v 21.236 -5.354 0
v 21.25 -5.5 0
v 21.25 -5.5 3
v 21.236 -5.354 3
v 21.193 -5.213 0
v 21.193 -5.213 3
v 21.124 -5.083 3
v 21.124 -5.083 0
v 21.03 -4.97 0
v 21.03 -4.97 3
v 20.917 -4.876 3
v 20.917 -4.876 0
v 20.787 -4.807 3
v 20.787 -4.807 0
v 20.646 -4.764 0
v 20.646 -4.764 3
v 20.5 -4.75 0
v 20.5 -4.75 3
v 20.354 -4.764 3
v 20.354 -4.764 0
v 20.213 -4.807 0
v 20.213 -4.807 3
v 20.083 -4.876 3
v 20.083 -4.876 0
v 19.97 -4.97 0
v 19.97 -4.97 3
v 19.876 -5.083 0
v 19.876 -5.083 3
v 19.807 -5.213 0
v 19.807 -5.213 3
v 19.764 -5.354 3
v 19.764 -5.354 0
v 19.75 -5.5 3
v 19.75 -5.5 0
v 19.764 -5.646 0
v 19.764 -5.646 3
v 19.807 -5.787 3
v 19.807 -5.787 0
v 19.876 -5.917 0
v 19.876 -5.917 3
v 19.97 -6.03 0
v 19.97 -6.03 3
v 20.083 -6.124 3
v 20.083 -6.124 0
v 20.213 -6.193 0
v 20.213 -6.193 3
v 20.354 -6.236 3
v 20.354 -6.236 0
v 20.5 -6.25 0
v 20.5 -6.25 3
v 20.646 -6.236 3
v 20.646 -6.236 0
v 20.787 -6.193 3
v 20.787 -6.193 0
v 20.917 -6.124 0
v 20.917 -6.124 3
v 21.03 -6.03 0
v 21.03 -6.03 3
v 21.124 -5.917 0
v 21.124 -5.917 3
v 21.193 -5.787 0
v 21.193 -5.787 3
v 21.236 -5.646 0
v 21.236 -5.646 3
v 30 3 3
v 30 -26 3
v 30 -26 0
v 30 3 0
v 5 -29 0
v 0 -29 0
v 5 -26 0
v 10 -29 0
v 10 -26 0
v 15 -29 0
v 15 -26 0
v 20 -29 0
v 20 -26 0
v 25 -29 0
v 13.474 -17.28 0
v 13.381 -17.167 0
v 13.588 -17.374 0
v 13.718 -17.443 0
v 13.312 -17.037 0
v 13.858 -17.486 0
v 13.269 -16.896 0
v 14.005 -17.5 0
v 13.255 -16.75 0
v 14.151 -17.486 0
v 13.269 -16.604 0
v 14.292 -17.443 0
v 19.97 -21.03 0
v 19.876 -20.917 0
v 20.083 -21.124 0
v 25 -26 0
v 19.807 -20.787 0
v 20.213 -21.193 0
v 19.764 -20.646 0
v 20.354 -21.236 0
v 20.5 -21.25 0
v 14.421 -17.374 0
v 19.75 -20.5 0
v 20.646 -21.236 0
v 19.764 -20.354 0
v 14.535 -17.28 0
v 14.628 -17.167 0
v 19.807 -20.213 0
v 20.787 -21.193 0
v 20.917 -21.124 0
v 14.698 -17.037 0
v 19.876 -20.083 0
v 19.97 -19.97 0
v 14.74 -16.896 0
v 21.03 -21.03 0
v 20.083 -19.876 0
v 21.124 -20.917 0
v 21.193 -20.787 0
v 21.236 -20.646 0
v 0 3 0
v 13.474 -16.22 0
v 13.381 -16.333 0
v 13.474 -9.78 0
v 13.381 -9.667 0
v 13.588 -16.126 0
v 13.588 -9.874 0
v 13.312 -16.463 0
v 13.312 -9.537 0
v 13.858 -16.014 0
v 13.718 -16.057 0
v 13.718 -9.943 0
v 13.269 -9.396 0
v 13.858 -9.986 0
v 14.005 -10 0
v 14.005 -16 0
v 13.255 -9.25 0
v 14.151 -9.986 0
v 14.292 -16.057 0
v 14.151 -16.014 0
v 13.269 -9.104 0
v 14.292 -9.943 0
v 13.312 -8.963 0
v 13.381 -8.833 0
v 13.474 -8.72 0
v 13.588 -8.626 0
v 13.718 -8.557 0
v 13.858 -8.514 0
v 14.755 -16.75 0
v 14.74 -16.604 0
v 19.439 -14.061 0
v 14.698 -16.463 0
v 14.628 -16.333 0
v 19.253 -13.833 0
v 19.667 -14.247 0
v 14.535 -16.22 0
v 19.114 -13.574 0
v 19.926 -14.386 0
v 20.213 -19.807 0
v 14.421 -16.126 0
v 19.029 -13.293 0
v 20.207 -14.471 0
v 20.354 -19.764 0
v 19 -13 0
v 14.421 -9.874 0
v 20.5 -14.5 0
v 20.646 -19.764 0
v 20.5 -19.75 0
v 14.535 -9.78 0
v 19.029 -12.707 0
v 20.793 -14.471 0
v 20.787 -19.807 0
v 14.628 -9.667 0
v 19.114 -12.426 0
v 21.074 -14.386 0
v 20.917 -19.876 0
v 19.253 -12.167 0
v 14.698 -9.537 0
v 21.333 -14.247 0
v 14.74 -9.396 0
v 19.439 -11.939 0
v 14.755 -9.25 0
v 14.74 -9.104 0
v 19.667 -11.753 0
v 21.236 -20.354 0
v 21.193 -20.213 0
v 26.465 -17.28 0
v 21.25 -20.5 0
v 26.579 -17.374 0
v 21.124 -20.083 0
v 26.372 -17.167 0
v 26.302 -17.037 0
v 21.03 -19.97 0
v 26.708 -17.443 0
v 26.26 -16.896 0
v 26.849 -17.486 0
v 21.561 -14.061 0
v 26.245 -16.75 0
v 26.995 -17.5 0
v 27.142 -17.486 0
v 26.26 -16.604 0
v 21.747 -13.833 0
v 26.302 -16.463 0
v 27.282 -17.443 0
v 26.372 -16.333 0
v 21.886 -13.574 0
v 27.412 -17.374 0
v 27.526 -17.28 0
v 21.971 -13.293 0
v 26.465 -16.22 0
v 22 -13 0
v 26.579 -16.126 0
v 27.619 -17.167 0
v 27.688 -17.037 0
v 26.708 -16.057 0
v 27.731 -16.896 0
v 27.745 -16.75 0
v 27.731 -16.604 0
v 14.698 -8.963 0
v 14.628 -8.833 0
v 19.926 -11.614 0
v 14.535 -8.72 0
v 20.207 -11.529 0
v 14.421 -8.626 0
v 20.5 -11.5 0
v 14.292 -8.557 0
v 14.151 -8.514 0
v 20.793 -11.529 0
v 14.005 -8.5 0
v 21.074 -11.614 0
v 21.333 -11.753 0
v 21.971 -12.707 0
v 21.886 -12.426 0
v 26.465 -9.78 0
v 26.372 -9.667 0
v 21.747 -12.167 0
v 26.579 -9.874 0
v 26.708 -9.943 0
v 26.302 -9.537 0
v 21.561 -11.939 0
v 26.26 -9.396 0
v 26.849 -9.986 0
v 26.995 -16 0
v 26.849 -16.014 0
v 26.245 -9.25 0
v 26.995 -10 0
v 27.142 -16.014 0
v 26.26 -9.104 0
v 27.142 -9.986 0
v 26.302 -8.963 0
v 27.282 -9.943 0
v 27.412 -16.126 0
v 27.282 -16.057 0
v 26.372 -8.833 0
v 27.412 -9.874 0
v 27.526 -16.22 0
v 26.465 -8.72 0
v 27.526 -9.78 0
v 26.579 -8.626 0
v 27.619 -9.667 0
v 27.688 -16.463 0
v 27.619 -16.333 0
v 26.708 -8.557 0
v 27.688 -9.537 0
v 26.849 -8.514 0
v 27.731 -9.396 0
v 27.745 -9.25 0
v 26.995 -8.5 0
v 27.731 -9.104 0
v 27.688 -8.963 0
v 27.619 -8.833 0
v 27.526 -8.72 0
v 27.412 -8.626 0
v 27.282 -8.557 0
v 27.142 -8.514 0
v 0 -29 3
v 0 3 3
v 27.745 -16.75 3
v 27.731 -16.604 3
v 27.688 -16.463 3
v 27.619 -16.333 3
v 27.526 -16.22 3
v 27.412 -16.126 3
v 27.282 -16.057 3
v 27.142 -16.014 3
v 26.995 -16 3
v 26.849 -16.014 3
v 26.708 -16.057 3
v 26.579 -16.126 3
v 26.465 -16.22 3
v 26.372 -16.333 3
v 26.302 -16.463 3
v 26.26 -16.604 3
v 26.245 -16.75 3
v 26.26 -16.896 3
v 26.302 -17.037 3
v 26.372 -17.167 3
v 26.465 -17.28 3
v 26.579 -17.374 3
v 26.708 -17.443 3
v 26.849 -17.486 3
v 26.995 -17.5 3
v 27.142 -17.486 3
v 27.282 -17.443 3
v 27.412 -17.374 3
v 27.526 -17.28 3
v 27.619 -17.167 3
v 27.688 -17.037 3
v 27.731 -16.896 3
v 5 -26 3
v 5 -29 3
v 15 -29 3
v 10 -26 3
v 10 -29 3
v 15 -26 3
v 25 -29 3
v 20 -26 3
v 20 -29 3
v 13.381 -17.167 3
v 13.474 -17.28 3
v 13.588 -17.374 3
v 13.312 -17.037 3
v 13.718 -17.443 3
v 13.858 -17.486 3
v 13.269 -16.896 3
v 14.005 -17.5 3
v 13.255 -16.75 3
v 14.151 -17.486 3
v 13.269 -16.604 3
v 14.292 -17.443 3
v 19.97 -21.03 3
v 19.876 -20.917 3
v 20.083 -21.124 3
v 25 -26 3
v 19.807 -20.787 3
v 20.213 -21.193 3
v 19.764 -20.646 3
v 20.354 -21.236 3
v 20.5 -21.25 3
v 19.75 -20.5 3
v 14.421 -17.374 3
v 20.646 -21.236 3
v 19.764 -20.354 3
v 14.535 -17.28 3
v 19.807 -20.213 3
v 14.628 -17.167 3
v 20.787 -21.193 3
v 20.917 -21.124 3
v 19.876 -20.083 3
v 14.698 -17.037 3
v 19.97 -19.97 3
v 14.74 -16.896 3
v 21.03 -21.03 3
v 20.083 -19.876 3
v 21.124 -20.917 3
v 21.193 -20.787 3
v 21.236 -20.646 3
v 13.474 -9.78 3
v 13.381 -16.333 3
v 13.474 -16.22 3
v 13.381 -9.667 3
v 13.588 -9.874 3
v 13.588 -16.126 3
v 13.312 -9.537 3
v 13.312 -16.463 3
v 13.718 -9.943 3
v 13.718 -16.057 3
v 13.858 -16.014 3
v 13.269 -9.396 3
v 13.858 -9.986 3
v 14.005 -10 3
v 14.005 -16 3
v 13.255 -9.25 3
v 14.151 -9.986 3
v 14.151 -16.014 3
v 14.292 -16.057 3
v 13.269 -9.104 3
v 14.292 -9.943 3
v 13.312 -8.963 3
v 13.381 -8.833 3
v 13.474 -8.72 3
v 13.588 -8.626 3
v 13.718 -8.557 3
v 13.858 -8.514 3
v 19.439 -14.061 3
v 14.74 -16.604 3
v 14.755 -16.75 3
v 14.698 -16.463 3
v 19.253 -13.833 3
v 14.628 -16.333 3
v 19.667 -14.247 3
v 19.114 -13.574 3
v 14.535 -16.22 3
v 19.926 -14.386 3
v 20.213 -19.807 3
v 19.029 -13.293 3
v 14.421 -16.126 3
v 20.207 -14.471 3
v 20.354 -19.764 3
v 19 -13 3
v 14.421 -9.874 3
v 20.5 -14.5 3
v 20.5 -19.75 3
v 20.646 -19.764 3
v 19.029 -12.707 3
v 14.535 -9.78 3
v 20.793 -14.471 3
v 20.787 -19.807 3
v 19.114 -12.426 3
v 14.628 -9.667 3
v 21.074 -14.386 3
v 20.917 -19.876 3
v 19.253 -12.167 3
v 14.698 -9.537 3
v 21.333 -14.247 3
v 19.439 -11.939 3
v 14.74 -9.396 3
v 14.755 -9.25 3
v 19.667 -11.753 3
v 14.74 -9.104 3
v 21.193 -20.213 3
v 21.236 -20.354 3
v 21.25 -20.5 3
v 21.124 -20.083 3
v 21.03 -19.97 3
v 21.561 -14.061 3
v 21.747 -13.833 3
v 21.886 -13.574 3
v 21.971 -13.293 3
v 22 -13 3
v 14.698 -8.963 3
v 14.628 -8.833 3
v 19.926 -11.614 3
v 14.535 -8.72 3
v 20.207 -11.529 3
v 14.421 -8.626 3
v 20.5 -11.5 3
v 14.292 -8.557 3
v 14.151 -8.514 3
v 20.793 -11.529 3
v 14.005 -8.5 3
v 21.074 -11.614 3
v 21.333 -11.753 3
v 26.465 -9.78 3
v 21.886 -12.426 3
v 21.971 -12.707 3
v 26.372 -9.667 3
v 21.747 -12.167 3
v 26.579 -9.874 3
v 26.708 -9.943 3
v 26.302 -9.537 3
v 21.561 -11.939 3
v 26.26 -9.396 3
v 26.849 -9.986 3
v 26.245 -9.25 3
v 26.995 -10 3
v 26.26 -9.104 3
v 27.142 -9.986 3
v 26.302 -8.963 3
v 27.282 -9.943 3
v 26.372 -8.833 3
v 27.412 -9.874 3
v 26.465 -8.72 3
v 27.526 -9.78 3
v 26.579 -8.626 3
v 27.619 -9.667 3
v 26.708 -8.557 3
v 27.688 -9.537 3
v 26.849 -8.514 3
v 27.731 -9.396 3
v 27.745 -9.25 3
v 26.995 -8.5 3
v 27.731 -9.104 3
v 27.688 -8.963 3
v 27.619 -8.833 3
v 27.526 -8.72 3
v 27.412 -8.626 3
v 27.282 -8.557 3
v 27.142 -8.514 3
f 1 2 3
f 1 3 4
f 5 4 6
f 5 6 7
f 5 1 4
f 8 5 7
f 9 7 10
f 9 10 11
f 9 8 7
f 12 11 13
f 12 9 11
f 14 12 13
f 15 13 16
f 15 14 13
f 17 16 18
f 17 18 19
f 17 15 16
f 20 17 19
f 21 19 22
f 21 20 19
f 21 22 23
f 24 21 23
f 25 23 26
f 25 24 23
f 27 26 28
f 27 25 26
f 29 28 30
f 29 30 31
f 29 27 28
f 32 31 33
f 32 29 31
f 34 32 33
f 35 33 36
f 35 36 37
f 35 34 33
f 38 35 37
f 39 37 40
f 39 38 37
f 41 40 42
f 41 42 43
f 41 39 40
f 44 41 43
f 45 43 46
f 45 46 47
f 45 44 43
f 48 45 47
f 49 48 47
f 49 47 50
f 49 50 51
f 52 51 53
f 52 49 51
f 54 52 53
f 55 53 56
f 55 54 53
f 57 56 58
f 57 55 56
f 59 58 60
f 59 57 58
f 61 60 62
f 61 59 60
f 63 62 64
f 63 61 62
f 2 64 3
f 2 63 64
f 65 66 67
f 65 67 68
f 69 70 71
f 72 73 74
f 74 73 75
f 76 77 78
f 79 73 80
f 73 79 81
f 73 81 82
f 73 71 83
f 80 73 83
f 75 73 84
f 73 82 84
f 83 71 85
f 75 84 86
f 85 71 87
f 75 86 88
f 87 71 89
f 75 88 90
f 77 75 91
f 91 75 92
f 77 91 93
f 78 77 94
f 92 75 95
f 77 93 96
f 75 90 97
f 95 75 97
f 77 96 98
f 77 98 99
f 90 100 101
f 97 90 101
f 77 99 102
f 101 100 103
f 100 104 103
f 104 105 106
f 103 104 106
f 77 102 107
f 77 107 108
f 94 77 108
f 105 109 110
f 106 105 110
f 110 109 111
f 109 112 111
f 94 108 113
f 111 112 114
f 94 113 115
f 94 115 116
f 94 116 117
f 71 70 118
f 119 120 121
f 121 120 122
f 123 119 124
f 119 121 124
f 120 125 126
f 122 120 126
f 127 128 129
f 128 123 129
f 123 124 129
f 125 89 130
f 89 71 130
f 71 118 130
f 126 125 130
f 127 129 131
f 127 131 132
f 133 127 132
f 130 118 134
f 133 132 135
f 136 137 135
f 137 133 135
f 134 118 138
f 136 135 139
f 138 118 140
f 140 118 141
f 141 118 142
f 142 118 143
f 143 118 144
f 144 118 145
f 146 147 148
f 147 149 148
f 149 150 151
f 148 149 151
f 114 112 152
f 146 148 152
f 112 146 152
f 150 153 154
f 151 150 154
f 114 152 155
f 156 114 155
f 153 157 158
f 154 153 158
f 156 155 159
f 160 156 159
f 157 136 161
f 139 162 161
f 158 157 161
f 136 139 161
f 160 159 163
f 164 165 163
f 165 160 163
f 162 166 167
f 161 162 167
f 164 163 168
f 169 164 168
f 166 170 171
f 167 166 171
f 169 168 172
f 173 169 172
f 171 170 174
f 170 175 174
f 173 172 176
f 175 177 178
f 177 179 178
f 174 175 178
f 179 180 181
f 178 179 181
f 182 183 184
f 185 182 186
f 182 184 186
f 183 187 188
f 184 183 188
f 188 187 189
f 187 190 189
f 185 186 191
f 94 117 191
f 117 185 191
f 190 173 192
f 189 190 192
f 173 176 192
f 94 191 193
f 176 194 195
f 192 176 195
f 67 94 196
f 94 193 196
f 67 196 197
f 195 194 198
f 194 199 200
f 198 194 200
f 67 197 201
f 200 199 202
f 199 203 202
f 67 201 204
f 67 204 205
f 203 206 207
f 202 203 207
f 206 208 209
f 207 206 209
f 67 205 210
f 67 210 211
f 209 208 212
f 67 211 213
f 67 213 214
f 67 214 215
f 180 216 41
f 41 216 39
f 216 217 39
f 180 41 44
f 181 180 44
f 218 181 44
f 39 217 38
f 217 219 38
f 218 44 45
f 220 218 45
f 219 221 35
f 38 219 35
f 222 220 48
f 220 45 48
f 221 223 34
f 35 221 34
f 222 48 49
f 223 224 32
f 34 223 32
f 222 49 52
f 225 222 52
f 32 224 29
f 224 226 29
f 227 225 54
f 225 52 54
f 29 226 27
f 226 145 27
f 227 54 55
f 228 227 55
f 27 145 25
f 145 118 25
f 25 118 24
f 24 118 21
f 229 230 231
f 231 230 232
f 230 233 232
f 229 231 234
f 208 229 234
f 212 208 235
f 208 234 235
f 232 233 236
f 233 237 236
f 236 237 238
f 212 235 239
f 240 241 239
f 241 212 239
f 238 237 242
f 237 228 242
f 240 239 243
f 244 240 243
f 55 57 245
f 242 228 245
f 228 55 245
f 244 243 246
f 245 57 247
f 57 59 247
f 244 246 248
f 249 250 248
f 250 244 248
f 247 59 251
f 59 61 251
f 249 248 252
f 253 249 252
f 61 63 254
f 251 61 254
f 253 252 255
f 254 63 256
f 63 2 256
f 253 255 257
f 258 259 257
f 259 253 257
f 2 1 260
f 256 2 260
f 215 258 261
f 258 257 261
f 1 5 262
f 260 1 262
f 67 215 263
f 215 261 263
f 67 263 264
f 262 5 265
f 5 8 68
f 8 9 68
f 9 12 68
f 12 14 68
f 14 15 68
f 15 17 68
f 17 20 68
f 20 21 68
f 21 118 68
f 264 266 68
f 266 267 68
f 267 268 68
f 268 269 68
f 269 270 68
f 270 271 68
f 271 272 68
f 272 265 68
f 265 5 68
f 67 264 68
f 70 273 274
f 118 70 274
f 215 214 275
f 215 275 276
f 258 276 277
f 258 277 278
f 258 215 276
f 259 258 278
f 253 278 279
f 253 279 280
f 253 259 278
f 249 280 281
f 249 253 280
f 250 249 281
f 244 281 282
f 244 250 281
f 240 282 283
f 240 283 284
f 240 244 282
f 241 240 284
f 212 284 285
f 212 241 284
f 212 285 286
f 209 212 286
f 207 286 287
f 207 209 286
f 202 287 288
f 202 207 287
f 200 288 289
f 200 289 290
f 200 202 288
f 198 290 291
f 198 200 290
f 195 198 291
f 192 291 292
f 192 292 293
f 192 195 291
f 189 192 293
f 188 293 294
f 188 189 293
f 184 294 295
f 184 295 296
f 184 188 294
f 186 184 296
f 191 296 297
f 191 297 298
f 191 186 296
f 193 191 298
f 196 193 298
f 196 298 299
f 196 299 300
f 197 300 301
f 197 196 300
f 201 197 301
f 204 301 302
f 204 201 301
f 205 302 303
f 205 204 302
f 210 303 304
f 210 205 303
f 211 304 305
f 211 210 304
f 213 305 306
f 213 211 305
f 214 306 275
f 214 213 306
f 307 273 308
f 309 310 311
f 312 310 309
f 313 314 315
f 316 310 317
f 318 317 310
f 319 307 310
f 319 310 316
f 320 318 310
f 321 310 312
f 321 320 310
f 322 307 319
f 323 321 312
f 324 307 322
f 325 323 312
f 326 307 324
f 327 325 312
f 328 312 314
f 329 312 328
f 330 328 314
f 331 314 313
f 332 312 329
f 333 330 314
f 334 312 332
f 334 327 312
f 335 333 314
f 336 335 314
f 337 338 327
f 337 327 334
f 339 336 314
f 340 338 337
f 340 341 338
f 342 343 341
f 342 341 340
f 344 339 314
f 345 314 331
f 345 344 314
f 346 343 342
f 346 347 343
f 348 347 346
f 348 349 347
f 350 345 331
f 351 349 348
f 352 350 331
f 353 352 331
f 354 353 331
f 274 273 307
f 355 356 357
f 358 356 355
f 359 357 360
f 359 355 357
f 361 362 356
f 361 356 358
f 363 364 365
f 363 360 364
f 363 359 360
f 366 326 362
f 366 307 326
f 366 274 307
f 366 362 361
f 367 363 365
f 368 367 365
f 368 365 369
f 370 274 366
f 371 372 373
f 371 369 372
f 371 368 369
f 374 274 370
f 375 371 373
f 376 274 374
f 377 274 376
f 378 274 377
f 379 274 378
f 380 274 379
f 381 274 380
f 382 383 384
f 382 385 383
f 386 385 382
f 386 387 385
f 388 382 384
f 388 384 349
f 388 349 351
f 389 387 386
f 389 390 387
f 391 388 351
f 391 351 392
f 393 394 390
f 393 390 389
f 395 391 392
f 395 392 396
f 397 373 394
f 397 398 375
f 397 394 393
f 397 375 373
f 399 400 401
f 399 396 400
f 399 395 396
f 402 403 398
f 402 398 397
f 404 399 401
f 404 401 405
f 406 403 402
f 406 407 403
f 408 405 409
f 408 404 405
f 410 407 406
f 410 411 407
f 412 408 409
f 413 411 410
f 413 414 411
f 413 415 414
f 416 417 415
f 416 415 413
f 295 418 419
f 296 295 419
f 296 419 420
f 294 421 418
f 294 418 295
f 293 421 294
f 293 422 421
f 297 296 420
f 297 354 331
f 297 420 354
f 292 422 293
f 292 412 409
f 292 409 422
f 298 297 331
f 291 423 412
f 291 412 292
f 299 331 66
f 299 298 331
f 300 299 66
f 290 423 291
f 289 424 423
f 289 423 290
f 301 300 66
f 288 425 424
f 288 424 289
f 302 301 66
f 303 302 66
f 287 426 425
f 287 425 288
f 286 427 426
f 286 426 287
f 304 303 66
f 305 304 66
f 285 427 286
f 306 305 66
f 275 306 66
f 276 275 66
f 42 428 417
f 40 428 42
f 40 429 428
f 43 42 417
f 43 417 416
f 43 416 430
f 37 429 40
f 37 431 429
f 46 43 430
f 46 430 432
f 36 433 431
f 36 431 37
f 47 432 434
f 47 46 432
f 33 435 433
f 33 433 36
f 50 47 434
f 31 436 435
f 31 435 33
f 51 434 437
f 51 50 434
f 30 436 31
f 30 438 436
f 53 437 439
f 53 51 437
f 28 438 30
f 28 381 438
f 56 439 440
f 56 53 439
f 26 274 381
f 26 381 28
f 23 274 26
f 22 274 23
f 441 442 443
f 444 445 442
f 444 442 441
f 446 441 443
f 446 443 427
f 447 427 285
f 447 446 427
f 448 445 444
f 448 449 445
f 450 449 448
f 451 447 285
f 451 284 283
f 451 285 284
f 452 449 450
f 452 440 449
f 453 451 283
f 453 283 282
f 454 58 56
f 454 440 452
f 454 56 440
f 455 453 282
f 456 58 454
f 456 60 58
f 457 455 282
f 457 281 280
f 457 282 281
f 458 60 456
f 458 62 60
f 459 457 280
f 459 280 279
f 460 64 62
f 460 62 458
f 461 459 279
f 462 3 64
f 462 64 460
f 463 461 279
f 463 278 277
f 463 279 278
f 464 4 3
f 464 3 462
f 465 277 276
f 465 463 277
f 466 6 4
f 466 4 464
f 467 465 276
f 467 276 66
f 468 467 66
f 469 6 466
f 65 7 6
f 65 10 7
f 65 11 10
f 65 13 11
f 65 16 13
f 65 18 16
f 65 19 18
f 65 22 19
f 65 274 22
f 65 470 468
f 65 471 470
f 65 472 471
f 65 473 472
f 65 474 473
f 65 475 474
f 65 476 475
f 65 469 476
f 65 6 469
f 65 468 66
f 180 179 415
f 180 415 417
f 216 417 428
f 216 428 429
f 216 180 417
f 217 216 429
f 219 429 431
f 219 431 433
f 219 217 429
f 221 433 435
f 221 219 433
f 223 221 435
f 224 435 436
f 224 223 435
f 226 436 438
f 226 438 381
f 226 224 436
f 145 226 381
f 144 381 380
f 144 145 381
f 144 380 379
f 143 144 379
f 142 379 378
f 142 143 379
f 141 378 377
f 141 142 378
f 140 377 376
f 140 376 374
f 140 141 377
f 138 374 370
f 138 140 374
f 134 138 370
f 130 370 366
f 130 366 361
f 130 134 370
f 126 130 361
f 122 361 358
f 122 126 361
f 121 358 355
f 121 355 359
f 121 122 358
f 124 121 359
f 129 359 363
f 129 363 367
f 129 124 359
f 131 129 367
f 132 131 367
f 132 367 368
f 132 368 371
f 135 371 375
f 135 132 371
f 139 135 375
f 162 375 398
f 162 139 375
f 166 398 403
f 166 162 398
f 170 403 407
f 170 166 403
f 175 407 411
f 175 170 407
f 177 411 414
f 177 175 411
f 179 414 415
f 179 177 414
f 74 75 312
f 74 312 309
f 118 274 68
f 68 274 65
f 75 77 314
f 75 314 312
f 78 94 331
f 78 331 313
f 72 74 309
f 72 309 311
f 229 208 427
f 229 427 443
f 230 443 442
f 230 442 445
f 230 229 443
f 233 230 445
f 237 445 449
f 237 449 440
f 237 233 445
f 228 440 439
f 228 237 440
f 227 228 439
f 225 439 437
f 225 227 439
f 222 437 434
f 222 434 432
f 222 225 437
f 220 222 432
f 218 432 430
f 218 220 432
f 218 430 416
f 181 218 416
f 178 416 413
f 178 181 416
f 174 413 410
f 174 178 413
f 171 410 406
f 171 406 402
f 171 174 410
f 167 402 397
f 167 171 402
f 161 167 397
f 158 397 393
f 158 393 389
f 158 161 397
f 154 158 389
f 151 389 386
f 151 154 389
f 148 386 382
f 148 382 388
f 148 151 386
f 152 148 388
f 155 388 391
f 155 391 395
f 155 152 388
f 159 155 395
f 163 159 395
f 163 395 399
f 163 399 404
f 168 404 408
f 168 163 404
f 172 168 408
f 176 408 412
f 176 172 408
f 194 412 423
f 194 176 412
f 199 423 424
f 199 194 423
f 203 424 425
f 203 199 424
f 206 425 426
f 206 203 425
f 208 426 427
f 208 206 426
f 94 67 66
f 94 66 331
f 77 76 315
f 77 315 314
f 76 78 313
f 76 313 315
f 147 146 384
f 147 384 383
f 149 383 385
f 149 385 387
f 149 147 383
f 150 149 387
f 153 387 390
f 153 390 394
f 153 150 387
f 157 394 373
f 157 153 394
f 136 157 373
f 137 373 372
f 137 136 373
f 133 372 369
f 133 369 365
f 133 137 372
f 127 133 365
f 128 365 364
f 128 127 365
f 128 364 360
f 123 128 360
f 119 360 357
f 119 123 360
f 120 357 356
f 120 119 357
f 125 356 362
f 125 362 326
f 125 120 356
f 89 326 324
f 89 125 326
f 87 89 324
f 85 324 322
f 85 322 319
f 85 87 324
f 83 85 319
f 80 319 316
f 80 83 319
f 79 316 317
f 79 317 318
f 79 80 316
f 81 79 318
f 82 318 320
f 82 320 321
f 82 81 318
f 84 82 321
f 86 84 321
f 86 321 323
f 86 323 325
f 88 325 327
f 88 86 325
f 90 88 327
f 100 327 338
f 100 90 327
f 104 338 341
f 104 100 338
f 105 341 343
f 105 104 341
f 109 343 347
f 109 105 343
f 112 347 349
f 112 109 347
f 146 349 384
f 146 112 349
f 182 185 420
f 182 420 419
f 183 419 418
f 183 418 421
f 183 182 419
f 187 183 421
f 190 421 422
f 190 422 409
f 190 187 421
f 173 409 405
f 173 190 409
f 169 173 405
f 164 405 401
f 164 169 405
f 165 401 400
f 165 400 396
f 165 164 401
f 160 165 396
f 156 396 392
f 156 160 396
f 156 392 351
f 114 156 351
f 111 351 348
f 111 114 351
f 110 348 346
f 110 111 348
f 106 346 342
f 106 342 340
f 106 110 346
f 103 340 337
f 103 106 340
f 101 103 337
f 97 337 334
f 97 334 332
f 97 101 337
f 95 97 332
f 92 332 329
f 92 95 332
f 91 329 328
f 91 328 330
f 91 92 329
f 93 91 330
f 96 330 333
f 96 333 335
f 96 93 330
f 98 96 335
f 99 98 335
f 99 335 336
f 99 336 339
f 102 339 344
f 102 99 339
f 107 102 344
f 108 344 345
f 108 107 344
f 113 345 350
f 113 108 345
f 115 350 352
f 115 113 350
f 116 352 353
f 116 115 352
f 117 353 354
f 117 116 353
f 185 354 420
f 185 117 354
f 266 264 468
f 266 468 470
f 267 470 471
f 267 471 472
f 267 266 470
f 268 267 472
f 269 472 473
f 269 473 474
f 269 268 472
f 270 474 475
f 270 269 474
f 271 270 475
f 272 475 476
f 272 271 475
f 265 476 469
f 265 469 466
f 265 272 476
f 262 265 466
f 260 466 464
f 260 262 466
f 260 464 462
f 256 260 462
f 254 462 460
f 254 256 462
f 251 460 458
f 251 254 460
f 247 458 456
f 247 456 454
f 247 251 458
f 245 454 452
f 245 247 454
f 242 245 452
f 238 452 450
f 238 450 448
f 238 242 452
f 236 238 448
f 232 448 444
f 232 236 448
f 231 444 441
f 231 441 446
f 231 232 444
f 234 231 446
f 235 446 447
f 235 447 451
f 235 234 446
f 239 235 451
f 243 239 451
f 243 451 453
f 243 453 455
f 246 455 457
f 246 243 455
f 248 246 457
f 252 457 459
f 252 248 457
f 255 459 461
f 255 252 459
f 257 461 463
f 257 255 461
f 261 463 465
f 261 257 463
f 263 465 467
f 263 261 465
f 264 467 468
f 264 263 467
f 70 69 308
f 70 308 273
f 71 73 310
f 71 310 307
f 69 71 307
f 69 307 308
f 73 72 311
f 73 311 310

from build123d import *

# Parameters (mm, degrees)
SKETCH1_R               = 0.75
SKETCH1_R_2             = 1.5
BOSS_EXTRUDE1_DEPTH     = 3
CORTAR_EXTRUIR1_START   = -3
CROQUIS1_W              = 15
CROQUIS1_H              = 6.71890751
CORTAR_EXTRUIR1_DEPTH   = 3
CROQUIS2_W              = 30
CROQUIS2_H              = 3
SALIENTE_EXTRUIR1_DEPTH = 3


with BuildPart() as part:
    # Sketch1 → Boss-Extrude1 (new body)
    with BuildSketch(Plane.XY):
        Polygon((10, 0), (10, 3), (15, 3), (15, 0), (20, 0), (20, 3), (25, 3), (25, 0), (30, 0), (30, -26), (25, -26), (25, -29), (20, -29), (20, -26), (15, -26), (15, -29), (10, -29), (10, -26), (5, -26), (5, -29), (0, -29), (0, 0), align=None)
        with Locations((20.5, -5.5)):
            Circle(SKETCH1_R, mode=Mode.SUBTRACT)
        with Locations((26.995190528, -9.25)):
            Circle(SKETCH1_R, mode=Mode.SUBTRACT)
        with Locations((26.995190528, -16.75)):
            Circle(SKETCH1_R, mode=Mode.SUBTRACT)
        with Locations((20.5, -20.5)):
            Circle(SKETCH1_R, mode=Mode.SUBTRACT)
        with Locations((14.004809472, -16.75)):
            Circle(SKETCH1_R, mode=Mode.SUBTRACT)
        with Locations((14.004809472, -9.25)):
            Circle(SKETCH1_R, mode=Mode.SUBTRACT)
        with Locations((20.5, -13)):
            Circle(SKETCH1_R_2, mode=Mode.SUBTRACT)
    extrude(amount=BOSS_EXTRUDE1_DEPTH)

    # Croquis1 → Cortar-Extruir1 (cut)
    with BuildSketch(Plane.XY.offset(3).offset(CORTAR_EXTRUIR1_START)):
        with Locations((17.5, 3.359453755)):
            Rectangle(CROQUIS1_W, CROQUIS1_H)
    extrude(amount=CORTAR_EXTRUIR1_DEPTH, mode=Mode.SUBTRACT)

    # Croquis2 → Saliente-Extruir1 (add)
    with BuildSketch(Plane.XY.offset(3)):
        with Locations((15, 1.5)):
            Rectangle(CROQUIS2_W, CROQUIS2_H)
    extrude(amount=-SALIENTE_EXTRUIR1_DEPTH)


solid = part.part
